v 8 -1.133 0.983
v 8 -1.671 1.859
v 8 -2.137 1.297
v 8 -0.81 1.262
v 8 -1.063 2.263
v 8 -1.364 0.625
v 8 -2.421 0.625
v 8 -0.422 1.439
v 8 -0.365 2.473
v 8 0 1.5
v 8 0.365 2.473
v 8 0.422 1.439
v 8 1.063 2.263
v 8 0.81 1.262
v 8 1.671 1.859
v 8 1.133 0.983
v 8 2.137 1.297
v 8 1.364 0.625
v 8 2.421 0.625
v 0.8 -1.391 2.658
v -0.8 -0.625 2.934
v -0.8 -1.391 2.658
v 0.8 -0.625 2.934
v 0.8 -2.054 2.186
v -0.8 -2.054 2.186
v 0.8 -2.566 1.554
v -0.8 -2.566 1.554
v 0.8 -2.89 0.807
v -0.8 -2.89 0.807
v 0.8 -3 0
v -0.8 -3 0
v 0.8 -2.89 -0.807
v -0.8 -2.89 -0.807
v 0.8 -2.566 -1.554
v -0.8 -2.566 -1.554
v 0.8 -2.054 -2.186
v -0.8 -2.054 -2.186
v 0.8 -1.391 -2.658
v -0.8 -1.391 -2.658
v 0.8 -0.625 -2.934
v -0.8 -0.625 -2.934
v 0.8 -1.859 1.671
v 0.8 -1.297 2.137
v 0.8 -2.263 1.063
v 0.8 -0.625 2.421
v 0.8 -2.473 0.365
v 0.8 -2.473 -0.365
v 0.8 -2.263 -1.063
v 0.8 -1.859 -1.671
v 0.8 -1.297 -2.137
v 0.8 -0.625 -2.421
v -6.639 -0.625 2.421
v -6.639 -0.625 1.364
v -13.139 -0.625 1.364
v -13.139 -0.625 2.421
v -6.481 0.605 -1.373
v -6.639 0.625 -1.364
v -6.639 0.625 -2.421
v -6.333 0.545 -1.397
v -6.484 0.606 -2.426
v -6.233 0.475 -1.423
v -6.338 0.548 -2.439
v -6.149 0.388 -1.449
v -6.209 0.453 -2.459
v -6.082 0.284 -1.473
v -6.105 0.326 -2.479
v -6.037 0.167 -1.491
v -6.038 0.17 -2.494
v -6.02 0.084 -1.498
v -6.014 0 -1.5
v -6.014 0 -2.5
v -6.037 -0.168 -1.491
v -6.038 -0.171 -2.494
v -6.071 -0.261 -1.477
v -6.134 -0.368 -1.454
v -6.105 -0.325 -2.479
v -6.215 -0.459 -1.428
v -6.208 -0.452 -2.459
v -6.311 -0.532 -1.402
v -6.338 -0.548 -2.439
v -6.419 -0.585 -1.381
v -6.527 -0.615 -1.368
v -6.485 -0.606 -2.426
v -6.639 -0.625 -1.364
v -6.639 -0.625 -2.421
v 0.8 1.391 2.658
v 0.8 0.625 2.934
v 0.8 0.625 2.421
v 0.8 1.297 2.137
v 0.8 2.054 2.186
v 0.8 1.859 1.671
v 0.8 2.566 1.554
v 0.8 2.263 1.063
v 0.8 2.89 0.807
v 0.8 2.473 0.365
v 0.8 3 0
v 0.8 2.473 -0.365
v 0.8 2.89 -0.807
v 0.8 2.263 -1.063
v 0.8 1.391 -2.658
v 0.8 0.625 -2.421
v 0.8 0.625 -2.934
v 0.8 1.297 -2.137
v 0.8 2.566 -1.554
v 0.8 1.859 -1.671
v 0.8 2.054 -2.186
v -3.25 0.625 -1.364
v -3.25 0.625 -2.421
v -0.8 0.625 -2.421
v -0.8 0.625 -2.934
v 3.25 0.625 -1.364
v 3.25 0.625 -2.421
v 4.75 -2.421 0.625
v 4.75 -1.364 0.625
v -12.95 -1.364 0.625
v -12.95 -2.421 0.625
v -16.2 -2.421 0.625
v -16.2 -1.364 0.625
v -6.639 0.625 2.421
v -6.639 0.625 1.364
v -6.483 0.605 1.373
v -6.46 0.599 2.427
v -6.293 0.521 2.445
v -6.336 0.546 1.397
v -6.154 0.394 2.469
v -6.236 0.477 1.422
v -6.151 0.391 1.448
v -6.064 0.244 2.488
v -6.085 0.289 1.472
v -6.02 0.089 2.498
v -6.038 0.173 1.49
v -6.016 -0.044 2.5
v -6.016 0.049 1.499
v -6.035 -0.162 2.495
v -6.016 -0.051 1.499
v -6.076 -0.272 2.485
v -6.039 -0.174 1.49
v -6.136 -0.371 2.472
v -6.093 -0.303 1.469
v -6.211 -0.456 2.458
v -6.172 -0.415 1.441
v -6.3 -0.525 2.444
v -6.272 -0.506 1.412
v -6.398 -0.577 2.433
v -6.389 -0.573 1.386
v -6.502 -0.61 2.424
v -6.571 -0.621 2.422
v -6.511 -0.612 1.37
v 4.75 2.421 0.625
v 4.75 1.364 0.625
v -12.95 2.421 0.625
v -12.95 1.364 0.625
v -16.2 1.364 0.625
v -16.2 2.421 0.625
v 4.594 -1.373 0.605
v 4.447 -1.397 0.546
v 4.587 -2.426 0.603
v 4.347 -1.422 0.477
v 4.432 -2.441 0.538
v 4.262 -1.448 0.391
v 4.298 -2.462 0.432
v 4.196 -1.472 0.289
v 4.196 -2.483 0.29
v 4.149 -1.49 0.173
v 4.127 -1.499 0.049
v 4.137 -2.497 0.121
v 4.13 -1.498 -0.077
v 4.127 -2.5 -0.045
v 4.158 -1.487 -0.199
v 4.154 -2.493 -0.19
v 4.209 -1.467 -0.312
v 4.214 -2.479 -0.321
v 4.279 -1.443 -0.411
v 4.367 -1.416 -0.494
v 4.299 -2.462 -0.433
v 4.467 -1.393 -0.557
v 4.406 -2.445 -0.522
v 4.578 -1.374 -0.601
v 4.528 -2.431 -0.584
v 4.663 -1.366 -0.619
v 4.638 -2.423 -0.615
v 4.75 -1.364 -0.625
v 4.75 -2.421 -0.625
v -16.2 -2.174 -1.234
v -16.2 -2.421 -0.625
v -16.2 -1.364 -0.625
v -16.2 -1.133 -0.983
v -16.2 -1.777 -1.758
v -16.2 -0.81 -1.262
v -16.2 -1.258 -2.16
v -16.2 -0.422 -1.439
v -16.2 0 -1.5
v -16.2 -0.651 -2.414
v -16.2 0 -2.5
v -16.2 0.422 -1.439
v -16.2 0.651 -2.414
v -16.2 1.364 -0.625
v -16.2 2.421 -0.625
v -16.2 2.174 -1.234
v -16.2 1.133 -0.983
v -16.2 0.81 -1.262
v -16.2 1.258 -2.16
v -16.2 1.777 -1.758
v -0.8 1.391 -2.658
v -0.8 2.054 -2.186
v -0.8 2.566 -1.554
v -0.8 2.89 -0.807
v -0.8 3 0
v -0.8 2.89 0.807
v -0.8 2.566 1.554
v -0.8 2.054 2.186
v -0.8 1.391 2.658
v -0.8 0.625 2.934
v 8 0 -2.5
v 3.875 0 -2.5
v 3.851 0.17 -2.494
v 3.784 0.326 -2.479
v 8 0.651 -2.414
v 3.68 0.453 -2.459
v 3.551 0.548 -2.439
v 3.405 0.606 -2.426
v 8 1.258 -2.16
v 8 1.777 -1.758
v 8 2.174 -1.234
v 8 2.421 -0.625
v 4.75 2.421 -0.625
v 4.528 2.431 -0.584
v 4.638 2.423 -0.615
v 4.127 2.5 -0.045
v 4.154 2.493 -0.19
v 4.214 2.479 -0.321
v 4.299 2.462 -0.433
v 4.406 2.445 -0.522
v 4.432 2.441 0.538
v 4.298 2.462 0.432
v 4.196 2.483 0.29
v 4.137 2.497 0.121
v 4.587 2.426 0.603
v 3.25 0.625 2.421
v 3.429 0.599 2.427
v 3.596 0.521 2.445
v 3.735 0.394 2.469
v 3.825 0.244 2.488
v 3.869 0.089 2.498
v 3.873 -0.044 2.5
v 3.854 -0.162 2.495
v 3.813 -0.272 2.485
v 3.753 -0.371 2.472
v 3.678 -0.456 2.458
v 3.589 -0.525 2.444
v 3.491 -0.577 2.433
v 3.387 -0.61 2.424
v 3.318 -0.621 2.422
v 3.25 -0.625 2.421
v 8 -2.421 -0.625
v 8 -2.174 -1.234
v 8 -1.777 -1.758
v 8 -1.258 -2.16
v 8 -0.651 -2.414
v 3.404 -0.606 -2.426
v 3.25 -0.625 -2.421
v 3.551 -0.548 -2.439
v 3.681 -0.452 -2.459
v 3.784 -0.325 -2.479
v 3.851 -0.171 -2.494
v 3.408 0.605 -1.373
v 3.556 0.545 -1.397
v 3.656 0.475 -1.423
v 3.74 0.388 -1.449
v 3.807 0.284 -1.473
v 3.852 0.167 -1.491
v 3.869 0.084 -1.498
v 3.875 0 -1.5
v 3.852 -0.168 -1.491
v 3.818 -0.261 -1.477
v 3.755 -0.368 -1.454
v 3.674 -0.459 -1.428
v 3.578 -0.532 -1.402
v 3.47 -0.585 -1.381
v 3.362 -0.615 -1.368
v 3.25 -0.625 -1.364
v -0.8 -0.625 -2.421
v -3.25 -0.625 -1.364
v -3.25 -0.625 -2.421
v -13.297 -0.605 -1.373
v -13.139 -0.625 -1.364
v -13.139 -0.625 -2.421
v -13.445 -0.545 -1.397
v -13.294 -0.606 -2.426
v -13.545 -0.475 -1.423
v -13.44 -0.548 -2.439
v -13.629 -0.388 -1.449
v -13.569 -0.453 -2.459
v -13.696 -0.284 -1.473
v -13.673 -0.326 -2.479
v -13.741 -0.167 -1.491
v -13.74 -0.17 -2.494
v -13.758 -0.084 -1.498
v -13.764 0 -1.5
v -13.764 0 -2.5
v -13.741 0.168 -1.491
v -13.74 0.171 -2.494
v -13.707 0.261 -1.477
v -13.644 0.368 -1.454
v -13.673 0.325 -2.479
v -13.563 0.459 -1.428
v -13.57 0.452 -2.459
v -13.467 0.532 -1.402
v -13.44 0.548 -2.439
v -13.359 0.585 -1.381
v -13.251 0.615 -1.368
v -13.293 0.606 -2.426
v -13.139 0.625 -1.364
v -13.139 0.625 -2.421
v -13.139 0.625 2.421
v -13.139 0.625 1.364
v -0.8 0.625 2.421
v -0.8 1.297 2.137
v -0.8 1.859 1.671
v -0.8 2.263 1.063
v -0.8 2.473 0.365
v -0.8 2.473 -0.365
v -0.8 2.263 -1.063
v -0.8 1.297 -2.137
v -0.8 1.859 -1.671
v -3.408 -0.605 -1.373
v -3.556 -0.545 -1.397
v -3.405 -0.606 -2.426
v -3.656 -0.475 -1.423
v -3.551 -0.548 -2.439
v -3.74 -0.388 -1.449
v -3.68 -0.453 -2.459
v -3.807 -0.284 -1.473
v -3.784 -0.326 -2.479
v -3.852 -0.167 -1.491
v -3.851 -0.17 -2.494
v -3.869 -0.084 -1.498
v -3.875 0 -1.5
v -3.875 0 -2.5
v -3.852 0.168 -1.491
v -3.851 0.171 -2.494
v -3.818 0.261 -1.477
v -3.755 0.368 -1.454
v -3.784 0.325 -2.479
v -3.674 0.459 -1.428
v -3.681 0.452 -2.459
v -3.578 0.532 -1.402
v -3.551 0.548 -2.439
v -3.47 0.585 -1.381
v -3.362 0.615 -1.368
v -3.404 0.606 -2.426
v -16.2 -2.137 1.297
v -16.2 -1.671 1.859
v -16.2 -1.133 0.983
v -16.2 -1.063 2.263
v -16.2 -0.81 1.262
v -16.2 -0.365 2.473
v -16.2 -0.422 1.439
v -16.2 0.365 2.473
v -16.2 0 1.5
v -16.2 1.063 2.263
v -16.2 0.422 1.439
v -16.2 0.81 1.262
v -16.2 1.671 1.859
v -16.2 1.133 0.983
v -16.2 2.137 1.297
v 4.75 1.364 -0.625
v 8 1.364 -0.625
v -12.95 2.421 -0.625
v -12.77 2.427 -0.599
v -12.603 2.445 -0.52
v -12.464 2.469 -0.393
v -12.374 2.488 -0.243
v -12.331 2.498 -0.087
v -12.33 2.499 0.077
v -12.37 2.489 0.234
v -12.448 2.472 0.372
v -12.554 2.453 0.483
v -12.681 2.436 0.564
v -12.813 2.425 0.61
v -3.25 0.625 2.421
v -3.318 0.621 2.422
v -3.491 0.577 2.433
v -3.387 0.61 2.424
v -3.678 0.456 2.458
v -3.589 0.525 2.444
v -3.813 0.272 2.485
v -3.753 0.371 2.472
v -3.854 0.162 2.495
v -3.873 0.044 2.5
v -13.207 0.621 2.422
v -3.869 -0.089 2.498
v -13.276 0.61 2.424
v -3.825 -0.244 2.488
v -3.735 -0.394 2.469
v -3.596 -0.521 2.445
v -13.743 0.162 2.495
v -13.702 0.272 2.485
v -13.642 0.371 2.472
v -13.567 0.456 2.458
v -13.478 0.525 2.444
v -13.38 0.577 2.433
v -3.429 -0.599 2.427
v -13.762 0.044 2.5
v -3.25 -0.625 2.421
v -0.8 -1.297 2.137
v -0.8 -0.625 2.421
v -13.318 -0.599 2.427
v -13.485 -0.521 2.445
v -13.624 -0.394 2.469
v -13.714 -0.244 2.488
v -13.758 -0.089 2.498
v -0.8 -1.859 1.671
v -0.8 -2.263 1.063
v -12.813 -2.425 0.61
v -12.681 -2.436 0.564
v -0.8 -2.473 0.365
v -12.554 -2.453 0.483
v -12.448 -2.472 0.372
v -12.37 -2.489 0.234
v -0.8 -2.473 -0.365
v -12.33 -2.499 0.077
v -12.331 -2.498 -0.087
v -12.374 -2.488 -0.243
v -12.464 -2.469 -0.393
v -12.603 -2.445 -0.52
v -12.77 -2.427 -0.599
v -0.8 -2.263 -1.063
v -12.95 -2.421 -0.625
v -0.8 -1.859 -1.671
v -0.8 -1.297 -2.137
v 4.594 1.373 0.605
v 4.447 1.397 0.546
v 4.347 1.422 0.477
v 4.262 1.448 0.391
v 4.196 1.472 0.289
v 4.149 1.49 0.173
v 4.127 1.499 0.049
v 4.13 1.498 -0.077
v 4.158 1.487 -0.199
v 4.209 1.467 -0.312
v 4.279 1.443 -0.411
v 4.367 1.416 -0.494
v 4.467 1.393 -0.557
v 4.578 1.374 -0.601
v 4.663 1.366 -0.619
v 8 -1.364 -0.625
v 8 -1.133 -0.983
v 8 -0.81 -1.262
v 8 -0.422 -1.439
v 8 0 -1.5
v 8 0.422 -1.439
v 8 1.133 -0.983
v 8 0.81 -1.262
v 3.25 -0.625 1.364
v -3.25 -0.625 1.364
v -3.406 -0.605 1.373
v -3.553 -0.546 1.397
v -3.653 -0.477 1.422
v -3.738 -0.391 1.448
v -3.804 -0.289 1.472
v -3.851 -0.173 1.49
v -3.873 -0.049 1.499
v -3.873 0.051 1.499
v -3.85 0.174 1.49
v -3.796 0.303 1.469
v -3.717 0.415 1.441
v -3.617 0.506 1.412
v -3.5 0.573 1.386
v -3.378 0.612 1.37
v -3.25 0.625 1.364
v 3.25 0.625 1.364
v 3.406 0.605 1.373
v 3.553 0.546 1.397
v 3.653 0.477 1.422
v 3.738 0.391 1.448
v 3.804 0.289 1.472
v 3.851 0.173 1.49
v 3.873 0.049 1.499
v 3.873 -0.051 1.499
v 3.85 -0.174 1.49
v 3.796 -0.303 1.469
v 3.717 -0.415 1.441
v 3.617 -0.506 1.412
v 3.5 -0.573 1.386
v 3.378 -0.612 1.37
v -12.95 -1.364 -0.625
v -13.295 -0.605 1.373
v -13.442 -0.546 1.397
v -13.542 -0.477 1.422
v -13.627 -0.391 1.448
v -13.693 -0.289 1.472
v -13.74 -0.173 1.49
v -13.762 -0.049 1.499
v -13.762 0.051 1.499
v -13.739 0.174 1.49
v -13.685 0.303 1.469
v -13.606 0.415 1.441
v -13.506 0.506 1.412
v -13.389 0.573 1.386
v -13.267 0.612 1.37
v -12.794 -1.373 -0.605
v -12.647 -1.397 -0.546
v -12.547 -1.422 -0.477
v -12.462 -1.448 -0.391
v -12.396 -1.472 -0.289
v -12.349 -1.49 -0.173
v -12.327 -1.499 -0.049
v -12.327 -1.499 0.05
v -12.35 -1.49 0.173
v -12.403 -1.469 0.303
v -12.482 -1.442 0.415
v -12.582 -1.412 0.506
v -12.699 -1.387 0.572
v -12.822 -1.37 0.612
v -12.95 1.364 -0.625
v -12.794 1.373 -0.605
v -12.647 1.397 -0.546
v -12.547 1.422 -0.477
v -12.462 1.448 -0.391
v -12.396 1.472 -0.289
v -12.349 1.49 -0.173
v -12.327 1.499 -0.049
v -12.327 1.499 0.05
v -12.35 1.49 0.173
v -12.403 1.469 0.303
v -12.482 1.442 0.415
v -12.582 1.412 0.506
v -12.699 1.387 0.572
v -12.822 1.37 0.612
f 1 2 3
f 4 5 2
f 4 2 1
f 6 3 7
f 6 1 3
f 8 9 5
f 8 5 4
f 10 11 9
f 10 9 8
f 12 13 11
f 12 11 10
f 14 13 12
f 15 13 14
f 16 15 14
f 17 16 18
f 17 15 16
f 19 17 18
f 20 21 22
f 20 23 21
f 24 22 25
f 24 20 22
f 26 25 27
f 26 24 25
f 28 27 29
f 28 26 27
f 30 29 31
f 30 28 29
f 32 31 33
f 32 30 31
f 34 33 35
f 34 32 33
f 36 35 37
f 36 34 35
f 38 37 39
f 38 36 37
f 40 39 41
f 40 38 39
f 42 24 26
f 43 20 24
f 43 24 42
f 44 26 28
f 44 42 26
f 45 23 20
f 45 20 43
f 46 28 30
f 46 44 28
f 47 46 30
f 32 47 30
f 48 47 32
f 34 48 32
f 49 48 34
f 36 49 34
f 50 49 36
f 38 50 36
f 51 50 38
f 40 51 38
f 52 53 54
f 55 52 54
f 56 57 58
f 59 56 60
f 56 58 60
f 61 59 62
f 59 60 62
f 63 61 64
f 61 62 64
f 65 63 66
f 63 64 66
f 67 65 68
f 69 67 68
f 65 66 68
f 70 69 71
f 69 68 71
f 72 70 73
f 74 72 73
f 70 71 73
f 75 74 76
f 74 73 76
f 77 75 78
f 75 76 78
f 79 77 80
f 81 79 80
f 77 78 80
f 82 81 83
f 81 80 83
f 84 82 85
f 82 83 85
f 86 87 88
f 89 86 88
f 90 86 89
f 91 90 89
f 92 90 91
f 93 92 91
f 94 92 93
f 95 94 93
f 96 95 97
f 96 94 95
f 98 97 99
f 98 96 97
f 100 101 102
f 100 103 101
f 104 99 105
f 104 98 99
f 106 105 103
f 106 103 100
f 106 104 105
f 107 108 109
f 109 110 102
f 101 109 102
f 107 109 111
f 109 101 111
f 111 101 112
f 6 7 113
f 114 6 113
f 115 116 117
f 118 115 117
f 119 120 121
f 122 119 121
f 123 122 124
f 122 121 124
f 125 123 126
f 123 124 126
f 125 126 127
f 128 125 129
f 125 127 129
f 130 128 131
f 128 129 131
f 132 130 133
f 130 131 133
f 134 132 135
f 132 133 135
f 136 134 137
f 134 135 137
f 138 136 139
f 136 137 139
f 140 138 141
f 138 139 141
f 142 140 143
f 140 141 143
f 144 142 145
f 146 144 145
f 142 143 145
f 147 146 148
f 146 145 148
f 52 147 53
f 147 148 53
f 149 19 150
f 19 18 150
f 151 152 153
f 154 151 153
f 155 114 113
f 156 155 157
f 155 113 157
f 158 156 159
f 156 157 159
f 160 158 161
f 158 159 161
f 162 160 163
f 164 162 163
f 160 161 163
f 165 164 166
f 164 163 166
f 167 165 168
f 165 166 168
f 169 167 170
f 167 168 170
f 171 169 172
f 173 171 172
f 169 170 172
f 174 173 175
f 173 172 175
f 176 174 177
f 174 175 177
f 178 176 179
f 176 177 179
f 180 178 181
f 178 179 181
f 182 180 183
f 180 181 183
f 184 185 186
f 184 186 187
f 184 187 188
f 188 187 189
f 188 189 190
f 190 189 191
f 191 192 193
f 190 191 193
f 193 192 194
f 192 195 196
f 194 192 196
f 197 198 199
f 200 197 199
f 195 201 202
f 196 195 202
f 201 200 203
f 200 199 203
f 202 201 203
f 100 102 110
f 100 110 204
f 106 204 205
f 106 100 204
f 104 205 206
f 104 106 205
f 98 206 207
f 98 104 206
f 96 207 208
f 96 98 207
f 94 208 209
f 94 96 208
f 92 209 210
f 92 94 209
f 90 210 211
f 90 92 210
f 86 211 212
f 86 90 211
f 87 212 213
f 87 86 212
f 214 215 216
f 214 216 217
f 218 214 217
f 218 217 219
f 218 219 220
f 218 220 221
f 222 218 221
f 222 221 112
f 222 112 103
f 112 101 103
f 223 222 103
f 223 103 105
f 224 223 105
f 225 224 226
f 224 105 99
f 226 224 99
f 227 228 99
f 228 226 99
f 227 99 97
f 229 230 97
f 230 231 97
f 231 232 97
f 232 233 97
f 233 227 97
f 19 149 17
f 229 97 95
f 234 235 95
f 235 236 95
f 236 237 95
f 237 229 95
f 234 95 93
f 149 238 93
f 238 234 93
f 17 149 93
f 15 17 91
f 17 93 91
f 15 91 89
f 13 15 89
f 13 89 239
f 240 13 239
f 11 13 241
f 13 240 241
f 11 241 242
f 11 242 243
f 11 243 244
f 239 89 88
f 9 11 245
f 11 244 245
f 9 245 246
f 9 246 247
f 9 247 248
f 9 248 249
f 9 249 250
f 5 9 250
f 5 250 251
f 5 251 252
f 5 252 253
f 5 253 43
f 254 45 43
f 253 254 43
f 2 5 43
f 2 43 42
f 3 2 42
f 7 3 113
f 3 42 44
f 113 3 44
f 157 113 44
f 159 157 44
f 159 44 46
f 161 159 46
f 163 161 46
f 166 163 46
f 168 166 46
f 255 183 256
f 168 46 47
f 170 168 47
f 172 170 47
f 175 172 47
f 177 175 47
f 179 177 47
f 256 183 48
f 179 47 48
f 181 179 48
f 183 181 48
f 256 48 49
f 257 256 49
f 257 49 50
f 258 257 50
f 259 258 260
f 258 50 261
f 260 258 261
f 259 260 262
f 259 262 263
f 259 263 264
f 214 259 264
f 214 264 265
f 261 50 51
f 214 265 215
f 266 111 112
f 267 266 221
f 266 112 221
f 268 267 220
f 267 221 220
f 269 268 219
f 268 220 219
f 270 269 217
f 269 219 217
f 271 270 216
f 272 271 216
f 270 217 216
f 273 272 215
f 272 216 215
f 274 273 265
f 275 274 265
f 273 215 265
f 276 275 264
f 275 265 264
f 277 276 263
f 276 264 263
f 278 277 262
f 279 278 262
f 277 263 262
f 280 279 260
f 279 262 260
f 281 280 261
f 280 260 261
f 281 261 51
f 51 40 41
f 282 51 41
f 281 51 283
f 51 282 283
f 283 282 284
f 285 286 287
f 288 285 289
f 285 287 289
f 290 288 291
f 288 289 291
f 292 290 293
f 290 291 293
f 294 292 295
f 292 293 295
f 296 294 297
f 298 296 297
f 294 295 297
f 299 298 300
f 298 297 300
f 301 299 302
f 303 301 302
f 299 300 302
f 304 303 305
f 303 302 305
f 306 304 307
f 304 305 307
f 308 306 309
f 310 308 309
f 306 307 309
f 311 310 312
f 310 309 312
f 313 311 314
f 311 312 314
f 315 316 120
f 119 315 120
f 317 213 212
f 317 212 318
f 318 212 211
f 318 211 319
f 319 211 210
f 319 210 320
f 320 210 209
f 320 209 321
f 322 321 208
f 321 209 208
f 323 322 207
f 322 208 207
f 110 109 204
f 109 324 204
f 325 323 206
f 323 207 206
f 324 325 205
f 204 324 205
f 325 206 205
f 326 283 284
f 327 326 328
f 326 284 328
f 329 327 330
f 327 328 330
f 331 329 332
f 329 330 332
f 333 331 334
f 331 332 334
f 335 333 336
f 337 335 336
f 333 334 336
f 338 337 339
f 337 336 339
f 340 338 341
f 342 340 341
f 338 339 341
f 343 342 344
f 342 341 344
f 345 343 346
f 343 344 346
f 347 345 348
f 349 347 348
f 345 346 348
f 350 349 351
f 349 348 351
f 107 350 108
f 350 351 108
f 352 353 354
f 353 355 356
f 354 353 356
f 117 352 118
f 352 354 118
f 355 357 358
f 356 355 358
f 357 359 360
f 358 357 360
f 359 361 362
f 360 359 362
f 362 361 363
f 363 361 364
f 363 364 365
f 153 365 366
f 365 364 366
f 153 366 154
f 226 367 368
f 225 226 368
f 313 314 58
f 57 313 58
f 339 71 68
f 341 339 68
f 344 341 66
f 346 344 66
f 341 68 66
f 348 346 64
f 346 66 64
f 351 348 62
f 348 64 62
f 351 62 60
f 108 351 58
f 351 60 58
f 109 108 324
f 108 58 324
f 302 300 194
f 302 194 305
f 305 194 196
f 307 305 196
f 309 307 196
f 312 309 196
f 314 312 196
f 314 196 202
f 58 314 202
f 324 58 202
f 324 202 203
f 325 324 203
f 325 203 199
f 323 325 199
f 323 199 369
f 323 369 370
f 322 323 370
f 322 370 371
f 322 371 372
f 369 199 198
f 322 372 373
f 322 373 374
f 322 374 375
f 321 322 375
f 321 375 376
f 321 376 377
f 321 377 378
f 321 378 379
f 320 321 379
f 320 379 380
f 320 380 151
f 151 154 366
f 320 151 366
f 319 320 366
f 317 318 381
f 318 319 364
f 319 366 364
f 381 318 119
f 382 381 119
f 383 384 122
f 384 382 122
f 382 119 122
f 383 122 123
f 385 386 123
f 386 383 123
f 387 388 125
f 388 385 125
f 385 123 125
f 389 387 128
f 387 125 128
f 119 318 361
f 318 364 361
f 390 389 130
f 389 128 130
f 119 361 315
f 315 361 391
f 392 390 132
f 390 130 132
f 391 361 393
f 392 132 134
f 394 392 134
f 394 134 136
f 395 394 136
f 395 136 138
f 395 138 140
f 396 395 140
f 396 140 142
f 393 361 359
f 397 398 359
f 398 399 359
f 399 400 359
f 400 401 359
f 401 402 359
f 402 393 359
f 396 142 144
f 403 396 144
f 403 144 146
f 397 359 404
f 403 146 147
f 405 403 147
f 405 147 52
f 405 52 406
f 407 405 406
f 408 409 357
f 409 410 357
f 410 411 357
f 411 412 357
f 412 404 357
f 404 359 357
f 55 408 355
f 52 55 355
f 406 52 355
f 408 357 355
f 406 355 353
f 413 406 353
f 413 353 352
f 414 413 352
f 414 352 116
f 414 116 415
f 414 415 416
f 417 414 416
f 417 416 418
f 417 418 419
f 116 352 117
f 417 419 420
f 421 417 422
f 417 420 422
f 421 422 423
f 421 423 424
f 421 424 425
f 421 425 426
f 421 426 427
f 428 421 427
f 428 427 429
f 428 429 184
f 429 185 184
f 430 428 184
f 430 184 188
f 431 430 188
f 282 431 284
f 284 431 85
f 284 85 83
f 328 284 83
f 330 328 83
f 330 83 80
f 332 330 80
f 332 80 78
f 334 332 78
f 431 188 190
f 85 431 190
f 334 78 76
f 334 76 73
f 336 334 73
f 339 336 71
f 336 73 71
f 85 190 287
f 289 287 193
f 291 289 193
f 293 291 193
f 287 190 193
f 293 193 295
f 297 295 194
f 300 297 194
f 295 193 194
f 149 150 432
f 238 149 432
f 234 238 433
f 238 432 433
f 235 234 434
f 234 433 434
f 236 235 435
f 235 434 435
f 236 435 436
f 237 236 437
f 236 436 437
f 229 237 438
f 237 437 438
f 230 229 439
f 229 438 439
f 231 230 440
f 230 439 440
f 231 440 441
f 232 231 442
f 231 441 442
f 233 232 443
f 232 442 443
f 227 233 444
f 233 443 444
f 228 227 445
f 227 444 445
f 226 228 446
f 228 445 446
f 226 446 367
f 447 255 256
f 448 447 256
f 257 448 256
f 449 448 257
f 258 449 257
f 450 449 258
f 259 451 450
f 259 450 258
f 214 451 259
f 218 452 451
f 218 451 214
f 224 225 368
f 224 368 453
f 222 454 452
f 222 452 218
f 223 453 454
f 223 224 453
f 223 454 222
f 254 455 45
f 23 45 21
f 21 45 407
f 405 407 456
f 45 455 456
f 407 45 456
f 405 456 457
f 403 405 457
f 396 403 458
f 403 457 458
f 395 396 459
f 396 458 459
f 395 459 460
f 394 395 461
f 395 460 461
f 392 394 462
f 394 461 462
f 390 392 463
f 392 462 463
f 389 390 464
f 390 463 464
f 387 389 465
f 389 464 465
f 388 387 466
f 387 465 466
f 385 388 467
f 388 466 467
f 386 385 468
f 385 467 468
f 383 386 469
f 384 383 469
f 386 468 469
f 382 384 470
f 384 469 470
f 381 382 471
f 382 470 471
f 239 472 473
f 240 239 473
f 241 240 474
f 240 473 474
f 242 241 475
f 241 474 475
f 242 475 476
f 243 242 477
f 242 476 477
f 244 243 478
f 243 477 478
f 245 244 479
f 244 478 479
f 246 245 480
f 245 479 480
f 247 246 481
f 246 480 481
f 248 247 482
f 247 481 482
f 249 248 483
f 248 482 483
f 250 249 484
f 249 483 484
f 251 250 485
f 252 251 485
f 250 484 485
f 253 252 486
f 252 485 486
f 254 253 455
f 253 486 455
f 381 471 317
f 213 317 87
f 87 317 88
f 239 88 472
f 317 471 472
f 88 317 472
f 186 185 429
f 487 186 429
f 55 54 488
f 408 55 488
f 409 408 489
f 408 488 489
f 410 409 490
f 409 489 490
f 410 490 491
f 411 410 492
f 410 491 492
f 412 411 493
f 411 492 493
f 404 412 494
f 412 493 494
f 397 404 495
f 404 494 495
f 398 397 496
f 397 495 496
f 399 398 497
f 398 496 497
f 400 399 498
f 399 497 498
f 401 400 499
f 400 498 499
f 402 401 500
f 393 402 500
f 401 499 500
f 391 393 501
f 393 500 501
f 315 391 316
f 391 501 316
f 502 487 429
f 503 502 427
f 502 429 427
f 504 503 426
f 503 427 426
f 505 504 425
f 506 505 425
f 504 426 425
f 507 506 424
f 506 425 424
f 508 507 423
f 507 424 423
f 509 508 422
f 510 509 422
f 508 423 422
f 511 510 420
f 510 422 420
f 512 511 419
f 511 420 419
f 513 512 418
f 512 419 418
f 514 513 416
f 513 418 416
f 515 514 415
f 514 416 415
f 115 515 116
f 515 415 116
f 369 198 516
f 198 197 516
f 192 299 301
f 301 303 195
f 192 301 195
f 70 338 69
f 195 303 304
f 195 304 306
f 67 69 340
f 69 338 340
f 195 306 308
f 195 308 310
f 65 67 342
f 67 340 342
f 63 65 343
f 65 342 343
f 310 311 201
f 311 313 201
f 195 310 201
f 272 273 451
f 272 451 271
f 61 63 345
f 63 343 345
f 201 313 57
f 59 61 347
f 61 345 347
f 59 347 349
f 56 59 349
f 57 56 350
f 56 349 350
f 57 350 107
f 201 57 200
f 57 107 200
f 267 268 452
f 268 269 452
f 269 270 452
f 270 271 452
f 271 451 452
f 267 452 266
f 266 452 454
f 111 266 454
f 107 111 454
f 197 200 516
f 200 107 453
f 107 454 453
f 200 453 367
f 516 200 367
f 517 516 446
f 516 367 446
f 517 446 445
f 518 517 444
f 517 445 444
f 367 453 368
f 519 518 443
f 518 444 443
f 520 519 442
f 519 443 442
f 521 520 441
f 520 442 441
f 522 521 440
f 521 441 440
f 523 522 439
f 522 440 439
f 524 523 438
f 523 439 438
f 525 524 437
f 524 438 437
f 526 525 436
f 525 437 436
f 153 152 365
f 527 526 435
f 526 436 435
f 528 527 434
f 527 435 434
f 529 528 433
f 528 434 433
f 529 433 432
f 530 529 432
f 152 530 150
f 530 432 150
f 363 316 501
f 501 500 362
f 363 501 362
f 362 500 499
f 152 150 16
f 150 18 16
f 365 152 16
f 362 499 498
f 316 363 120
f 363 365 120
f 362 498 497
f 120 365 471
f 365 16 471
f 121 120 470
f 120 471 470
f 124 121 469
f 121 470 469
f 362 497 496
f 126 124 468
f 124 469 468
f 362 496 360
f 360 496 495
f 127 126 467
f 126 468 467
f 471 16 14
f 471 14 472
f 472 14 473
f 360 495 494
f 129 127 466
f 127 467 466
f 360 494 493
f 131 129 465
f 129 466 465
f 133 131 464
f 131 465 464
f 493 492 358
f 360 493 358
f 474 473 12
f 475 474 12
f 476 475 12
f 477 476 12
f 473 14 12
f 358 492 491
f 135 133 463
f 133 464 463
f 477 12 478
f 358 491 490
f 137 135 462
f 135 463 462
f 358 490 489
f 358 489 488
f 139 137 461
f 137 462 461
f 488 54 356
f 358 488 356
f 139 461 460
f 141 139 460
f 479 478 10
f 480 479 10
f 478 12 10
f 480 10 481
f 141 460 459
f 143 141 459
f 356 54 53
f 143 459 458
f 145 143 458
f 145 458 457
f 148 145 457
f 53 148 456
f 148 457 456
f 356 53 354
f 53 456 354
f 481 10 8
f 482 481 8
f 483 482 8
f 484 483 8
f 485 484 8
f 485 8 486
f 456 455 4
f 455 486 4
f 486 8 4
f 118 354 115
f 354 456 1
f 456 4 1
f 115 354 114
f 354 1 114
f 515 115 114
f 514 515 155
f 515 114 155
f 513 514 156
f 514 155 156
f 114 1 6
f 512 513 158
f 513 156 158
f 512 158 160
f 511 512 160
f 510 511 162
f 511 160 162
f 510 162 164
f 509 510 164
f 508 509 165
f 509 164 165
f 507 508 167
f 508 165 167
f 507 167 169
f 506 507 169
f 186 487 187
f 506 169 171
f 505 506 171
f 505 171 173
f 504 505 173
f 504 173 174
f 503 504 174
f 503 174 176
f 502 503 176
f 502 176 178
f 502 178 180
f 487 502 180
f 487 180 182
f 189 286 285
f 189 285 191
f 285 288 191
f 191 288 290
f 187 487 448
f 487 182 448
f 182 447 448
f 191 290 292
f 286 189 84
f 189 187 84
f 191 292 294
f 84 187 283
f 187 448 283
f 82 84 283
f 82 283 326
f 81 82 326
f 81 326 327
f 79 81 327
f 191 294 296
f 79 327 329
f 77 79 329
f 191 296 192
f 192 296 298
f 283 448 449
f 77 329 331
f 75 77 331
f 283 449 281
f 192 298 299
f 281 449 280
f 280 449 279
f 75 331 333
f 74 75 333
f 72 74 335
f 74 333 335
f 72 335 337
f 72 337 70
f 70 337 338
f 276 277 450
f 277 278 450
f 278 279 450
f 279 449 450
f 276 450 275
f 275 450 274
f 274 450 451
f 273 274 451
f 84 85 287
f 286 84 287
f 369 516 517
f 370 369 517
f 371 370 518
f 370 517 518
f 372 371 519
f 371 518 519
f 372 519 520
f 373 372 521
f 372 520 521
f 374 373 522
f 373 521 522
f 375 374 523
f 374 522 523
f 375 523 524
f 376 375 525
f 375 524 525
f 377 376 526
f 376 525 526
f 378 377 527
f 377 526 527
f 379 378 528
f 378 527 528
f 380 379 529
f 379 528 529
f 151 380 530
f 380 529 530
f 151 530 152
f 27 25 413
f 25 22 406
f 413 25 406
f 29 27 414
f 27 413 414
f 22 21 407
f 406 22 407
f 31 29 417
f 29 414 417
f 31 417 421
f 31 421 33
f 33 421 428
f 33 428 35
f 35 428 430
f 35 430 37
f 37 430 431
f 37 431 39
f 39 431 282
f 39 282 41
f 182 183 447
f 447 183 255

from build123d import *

# Parameters (mm, degrees)
SKETCH1_R                = 3
BOSS_EXTRUDE1_DEPTH      = 0.8
BOSS_EXTRUDE2_DEPTH      = 7.2
BOSS_EXTRUDE2_DEPTH_BACK = 17
SKETCH2_R                = 2.5
CUT_EXTRUDE1_DEPTH       = 17.746342884
CUT_EXTRUDE1_DEPTH_BACK  = 17.746342884
SKETCH4_R                = 1.5
CUT_EXTRUDE2_DEPTH       = 25.561135557
CUT_EXTRUDE3_DEPTH       = 17.734675923
CUT_EXTRUDE3_DEPTH_BACK  = 17.734675923


with BuildPart() as part:
    # Sketch1 → Boss-Extrude1 (new, symmetric)
    with BuildSketch(Plane(origin=(0, 0, 0), x_dir=(0, 0, -1), z_dir=(1, 0, 0))):
        Circle(SKETCH1_R)
    extrude(amount=BOSS_EXTRUDE1_DEPTH, both=True)

    # Sketch2 → Boss-Extrude2 (add, two sides: drawn at the far end of the back side and taken through both)
    with BuildSketch(Plane(origin=(0.8, 0, 0), x_dir=(0, 0, -1), z_dir=(1, 0, 0)).offset(-BOSS_EXTRUDE2_DEPTH_BACK)):
        Circle(SKETCH2_R)
    extrude(amount=BOSS_EXTRUDE2_DEPTH + BOSS_EXTRUDE2_DEPTH_BACK)

    # Sketch3 → Cut-Extrude1 (cut, two sides: drawn at the far end of the back side and taken through both)
    with BuildSketch(Plane.XY.offset(-CUT_EXTRUDE1_DEPTH_BACK)):
        with BuildLine():
            Line((-3.25, 0.625), (3.25, 0.625))
            ThreePointArc((3.25, 0.625), (3.875, 0), (3.25, -0.625))
            Line((3.25, -0.625), (-3.25, -0.625))
            ThreePointArc((-3.25, -0.625), (-3.875, 0), (-3.25, 0.625))
        make_face()
        with BuildLine():
            Line((-13.139009245, 0.625), (-6.639009245, 0.625))
            ThreePointArc((-6.639009245, 0.625), (-6.014009245, 0), (-6.639009245, -0.625))
            Line((-6.639009245, -0.625), (-13.139009245, -0.625))
            ThreePointArc((-13.139009245, -0.625), (-13.764009245, 0), (-13.139009245, 0.625))
        make_face()
    extrude(amount=CUT_EXTRUDE1_DEPTH + CUT_EXTRUDE1_DEPTH_BACK, mode=Mode.SUBTRACT)

    # Sketch4 → Cut-Extrude2 (cut, through all)
    with BuildSketch(Plane(origin=(8, 0, 0), x_dir=(0, 0, -1), z_dir=(1, 0, 0))):
        Circle(SKETCH4_R)
    extrude(amount=-CUT_EXTRUDE2_DEPTH, mode=Mode.SUBTRACT)

    # Sketch5 → Cut-Extrude3 (cut, two sides: drawn at the far end of the back side and taken through both)
    with BuildSketch(Plane(origin=(0, 0, 0), x_dir=(1, 0, 0), z_dir=(0, 1, 0)).offset(-CUT_EXTRUDE3_DEPTH_BACK)):
        with BuildLine():
            Line((-19.45, 0.625), (-12.95, 0.625))
            ThreePointArc((-12.95, 0.625), (-12.325, 0), (-12.95, -0.625))
            Line((-12.95, -0.625), (-19.45, -0.625))
            ThreePointArc((-19.45, -0.625), (-20.075, 0), (-19.45, 0.625))
        make_face()
        with BuildLine():
            Line((11.25, -0.625), (4.75, -0.625))
            ThreePointArc((4.75, -0.625), (4.125, 0), (4.75, 0.625))
            Line((4.75, 0.625), (11.25, 0.625))
            ThreePointArc((11.25, 0.625), (11.875, 0), (11.25, -0.625))
        make_face()
    extrude(amount=CUT_EXTRUDE3_DEPTH + CUT_EXTRUDE3_DEPTH_BACK, mode=Mode.SUBTRACT)


solid = part.part
